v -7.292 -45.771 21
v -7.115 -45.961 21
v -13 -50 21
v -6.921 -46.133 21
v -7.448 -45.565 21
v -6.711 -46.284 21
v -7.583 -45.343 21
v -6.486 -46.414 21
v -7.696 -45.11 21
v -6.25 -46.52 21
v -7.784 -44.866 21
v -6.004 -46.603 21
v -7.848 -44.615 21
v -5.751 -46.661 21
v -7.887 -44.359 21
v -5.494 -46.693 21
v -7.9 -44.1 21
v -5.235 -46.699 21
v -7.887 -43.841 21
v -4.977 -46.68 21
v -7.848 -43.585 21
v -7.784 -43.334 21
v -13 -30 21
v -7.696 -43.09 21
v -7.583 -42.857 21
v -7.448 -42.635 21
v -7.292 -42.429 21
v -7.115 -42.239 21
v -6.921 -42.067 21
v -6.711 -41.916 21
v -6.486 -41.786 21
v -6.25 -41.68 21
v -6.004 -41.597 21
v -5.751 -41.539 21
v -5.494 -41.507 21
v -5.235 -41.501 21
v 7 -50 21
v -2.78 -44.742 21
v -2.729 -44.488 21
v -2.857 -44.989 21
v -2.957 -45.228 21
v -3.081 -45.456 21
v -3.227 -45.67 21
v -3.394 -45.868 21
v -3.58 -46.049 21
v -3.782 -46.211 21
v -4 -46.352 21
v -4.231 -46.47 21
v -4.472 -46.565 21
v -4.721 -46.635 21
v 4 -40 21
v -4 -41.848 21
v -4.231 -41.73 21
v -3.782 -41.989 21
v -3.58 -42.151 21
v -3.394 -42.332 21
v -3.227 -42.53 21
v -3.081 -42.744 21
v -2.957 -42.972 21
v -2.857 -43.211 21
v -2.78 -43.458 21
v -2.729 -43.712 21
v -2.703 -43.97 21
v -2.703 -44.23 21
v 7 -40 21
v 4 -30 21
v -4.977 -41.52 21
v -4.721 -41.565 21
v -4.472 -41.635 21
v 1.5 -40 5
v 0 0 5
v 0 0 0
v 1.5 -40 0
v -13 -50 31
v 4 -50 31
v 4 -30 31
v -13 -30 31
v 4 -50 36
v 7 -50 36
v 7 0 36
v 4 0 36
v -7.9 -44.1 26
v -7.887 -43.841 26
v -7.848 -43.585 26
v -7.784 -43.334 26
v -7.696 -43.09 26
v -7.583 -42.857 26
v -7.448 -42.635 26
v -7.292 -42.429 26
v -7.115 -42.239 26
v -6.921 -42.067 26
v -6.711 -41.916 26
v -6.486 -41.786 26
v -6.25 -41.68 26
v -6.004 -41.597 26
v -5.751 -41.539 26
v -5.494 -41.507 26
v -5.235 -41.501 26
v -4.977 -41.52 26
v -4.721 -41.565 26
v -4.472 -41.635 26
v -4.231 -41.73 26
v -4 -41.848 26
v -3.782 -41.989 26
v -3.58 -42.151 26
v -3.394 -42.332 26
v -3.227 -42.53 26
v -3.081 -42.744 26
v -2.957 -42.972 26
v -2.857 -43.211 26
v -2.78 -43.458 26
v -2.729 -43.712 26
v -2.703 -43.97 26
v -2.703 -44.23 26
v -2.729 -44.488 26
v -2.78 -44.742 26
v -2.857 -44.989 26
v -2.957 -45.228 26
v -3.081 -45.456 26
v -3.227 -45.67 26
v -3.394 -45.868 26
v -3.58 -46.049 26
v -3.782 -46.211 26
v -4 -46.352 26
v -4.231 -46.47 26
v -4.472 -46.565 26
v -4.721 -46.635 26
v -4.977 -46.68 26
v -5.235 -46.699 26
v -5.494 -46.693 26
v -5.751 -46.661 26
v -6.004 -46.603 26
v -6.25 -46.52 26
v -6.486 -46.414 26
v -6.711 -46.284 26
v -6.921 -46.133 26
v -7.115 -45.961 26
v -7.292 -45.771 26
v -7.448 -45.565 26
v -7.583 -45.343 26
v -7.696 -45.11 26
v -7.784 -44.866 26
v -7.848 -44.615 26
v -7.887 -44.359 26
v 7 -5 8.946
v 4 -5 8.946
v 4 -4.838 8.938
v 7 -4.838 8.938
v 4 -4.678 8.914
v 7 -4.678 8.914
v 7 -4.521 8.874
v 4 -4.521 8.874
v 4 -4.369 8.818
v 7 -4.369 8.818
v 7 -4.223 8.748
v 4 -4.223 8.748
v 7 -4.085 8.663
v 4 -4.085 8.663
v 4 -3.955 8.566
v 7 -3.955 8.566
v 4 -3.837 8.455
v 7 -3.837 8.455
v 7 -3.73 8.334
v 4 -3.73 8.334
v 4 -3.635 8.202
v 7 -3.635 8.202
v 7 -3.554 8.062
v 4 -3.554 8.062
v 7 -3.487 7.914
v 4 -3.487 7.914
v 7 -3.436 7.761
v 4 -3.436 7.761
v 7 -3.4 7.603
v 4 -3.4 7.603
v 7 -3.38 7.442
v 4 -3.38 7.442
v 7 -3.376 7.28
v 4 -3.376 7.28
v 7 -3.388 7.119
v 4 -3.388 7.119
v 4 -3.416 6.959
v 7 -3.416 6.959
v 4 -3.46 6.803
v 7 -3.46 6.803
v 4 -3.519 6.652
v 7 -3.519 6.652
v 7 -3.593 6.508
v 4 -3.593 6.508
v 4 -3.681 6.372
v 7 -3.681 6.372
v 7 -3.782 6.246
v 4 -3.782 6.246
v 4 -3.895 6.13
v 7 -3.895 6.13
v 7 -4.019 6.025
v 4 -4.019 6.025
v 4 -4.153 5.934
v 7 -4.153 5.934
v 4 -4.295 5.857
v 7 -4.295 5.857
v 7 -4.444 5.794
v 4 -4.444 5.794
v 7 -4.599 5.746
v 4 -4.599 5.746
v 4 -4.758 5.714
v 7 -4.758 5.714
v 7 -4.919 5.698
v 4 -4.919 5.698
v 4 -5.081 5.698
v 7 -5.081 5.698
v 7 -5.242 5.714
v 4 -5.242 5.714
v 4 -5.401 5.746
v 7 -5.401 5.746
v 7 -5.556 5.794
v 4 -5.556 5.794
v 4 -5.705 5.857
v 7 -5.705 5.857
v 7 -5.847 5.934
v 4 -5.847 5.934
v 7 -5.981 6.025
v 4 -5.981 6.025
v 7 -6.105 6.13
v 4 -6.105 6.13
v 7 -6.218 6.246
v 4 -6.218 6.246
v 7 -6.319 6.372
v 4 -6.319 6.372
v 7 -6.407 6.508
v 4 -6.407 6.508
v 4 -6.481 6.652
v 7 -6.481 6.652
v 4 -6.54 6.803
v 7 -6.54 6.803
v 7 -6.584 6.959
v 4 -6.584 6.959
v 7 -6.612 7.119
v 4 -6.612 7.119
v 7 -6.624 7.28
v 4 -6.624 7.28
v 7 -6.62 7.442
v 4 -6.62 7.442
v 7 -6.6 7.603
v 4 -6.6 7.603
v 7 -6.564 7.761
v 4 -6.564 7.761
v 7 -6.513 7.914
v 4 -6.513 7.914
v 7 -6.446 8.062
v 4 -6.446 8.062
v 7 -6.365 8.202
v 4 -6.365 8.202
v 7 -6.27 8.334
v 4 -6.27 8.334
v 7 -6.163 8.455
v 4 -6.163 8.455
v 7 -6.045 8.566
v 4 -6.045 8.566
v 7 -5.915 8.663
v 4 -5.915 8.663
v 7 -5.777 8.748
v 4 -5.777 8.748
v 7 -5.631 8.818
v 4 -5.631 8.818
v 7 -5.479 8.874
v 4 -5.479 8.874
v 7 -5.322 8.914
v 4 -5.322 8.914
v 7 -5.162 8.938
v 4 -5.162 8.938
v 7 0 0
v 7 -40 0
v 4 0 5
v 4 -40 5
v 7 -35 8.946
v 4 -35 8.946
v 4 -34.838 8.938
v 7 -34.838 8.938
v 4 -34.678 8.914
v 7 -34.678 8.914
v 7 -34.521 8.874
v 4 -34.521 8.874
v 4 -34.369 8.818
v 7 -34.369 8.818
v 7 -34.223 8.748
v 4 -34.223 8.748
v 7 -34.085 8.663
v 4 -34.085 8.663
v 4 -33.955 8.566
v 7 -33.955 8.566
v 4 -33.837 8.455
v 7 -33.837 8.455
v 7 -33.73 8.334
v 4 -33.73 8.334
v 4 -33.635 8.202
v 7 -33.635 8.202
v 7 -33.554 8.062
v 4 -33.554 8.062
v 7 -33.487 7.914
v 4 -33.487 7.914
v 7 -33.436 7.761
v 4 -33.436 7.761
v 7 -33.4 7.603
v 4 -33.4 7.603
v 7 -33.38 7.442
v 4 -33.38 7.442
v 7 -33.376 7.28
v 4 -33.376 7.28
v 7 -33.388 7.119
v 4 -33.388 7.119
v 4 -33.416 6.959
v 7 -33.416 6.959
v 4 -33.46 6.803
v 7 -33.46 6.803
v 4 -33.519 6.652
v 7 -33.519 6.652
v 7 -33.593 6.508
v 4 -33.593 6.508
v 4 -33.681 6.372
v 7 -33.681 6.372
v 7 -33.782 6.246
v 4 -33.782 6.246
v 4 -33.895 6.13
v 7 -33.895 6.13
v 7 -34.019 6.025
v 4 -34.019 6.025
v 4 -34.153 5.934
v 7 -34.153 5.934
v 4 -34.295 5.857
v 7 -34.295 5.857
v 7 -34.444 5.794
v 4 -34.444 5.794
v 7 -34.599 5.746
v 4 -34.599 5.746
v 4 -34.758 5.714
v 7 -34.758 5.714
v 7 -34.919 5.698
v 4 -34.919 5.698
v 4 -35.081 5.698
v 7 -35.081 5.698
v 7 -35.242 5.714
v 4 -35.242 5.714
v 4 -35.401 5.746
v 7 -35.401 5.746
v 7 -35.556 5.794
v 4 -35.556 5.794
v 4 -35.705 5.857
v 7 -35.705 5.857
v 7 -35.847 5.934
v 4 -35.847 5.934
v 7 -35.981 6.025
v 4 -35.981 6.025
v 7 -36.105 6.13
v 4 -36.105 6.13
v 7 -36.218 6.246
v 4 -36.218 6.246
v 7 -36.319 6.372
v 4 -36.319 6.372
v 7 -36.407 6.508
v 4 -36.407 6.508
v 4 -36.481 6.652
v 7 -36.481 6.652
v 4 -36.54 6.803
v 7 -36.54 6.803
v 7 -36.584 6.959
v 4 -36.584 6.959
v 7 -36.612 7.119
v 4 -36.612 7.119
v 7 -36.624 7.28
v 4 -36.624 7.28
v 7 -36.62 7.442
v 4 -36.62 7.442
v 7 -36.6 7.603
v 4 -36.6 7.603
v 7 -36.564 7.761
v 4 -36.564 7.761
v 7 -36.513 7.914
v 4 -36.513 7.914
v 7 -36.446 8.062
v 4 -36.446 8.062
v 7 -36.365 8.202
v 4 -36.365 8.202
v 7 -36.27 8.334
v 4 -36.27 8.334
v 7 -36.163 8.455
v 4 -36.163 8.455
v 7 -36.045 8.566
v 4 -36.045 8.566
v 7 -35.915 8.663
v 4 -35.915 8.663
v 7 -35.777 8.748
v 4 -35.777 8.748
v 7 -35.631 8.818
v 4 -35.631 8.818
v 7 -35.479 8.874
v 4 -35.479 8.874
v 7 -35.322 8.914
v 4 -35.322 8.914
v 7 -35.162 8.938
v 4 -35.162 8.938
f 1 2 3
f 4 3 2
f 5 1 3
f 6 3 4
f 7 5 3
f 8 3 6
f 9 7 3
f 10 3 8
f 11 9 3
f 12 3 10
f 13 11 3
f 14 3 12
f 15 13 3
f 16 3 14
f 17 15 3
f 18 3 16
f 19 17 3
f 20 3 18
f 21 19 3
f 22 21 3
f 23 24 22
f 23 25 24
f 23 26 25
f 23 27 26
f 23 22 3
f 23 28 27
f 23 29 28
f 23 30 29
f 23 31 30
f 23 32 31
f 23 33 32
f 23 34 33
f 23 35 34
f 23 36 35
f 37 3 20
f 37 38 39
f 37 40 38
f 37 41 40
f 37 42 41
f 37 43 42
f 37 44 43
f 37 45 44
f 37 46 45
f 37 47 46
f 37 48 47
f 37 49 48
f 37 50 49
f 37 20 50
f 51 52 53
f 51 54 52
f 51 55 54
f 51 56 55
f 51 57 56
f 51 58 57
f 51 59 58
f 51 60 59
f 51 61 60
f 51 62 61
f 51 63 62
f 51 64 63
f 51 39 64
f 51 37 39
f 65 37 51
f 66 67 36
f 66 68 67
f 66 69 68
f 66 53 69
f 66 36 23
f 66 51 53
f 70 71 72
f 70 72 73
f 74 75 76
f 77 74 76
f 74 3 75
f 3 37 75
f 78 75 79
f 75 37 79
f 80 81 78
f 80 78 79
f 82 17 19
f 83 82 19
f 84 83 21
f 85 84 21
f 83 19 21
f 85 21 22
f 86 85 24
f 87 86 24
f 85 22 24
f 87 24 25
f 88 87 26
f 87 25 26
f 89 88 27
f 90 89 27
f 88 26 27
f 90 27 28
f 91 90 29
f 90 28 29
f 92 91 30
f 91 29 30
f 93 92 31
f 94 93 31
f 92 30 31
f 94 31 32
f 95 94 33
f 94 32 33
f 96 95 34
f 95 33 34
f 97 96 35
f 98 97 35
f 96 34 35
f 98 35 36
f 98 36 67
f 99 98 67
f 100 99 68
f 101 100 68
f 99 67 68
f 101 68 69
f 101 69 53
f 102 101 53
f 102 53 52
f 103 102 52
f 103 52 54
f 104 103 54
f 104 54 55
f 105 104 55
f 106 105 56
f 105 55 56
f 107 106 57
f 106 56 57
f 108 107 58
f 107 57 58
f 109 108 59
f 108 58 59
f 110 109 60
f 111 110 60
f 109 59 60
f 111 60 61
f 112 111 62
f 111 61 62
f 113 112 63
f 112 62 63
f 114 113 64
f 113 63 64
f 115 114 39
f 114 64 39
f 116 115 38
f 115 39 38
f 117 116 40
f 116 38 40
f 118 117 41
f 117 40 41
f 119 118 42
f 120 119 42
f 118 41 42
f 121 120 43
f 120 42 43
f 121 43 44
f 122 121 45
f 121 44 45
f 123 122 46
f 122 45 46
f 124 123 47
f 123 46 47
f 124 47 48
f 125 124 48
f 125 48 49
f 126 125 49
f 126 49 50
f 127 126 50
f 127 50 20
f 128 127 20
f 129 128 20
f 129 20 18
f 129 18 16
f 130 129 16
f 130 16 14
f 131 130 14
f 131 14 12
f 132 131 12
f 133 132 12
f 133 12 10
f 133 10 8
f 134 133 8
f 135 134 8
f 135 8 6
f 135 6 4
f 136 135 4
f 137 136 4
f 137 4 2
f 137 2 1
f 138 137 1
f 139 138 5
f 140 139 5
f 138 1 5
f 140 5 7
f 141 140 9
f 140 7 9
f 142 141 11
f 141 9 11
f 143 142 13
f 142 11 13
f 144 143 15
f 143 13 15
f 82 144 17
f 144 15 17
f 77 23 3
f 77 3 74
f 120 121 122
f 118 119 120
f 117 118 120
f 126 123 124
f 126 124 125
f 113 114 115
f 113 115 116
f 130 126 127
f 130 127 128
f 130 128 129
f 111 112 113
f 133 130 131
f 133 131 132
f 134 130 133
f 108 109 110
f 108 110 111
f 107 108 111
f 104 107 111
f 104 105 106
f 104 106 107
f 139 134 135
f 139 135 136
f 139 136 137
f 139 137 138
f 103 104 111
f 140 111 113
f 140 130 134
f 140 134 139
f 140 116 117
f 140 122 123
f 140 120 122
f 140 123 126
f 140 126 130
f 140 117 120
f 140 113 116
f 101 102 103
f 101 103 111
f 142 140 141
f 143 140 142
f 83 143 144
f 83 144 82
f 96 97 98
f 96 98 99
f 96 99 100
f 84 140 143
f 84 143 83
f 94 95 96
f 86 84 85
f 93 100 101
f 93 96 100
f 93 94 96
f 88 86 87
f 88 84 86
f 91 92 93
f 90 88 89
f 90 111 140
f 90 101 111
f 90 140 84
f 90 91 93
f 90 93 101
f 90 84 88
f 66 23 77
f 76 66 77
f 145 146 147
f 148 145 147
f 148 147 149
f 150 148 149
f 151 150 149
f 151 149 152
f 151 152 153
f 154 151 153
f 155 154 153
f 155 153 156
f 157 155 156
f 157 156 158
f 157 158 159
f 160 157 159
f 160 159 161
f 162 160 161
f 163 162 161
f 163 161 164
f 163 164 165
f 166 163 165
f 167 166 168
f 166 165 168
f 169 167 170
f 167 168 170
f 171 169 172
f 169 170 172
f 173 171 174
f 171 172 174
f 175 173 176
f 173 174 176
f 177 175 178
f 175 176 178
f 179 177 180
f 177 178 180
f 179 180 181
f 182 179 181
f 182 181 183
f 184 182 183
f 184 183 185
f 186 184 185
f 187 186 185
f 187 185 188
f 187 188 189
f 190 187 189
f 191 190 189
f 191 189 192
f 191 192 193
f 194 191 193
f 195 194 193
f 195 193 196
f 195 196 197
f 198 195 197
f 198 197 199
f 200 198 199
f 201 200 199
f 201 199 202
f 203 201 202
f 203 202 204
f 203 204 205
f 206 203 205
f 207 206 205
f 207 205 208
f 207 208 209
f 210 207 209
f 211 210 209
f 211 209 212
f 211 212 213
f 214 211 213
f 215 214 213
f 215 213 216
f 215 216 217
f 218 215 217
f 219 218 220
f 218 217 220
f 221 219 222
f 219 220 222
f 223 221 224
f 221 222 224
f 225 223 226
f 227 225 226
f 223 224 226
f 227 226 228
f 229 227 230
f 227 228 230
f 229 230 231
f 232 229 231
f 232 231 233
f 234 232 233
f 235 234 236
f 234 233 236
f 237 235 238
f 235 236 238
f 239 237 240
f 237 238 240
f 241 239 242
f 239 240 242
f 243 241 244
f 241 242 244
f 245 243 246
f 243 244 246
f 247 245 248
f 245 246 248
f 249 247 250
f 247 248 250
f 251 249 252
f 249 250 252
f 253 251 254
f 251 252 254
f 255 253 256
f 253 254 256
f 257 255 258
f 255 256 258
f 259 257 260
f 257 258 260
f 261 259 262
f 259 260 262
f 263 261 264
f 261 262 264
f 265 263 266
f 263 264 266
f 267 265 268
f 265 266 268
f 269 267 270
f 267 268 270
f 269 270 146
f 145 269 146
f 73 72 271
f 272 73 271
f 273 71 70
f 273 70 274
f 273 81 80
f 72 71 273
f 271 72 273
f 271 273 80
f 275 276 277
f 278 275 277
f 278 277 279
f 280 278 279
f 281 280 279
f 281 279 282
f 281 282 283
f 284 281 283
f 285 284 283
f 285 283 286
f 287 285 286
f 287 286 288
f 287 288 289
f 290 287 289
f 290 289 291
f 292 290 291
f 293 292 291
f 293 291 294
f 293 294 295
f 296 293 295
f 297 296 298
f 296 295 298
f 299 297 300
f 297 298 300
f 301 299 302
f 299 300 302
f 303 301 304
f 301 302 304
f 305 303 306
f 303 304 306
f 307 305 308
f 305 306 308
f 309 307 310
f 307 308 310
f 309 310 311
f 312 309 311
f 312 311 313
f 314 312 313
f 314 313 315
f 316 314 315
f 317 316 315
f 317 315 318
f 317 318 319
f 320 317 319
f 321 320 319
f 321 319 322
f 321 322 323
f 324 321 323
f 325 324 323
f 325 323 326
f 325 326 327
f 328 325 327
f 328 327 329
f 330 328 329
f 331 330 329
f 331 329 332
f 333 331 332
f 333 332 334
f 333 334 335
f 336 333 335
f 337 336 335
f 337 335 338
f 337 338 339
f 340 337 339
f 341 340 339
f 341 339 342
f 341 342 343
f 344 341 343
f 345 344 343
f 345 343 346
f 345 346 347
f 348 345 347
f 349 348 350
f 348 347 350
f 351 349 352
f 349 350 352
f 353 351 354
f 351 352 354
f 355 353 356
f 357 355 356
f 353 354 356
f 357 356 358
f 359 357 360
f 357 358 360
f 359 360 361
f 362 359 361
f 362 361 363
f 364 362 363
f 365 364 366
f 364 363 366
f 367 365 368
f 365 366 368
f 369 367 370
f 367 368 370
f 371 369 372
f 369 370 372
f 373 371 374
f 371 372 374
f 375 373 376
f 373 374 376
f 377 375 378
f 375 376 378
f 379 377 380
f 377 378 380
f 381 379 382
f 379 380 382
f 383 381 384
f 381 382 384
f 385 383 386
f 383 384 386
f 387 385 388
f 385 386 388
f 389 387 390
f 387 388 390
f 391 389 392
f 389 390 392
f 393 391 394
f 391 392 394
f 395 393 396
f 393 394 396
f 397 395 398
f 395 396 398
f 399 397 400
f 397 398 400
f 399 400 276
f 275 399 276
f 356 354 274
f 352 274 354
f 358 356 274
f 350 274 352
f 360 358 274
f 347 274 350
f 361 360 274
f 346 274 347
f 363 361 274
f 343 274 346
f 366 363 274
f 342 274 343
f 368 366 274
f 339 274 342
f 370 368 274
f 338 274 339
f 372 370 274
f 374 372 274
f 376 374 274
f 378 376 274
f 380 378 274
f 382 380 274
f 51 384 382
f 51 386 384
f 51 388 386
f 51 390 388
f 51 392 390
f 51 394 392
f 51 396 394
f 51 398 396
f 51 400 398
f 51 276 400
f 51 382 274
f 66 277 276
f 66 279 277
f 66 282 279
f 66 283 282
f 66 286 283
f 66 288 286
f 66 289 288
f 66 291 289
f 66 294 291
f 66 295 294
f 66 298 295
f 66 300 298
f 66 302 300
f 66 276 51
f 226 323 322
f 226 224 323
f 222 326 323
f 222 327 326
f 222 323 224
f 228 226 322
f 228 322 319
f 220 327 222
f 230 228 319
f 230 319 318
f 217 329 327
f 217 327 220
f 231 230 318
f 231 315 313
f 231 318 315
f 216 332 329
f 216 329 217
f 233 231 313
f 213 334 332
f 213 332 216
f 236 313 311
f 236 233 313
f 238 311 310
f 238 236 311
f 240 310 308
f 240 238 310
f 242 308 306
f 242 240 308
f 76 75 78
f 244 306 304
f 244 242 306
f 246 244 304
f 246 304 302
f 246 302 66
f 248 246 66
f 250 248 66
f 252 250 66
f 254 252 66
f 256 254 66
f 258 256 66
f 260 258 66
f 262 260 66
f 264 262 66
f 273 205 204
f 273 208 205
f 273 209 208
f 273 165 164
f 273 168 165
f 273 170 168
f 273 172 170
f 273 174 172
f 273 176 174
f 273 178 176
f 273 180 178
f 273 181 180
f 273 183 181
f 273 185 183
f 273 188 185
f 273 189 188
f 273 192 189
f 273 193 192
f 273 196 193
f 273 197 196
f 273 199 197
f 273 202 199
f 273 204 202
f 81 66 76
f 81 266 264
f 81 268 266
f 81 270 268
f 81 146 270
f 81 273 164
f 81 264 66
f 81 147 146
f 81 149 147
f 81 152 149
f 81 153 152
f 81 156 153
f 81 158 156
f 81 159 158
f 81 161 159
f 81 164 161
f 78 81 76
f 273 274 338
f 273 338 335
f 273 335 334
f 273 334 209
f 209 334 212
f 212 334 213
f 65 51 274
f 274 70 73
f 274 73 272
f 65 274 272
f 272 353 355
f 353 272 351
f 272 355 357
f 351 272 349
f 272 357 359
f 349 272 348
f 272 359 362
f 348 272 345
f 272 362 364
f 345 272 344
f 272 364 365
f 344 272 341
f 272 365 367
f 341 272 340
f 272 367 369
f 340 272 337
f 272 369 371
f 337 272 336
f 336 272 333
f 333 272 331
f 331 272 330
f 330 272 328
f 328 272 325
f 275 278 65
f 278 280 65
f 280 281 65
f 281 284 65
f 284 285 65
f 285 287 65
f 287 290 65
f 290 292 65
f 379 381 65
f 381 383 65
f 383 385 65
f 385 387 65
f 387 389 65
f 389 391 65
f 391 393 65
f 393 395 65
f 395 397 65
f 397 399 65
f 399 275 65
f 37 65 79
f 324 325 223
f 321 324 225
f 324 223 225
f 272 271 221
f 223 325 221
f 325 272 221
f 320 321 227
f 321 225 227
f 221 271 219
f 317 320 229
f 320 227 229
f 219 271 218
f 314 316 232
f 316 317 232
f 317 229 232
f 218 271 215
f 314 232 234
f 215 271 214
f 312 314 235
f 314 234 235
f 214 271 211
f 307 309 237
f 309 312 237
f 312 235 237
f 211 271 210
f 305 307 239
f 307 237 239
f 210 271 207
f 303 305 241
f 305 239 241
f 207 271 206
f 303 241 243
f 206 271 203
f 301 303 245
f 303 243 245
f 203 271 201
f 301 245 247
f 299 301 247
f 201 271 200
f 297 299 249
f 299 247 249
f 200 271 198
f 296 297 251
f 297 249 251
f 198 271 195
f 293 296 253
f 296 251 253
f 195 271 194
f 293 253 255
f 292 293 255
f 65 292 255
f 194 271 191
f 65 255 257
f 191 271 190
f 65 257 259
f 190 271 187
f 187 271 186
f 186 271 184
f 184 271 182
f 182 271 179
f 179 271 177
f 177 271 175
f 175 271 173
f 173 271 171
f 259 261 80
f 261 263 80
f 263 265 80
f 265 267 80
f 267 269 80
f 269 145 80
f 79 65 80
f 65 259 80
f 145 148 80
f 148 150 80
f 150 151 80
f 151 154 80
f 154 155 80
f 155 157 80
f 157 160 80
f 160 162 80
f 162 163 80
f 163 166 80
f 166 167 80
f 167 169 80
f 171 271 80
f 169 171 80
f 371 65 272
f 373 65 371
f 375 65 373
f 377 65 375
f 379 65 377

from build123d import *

# Parameters (mm, degrees)
ESQUISSE1_W             = 7
ESQUISSE1_H             = 40
BOSS_EXTRU_1_DEPTH      = 5
ENL_V_MAT_EXTRU_1_DEPTH = 5
ESQUISSE3_W             = 3
ESQUISSE3_H             = 40
BOSS_EXTRU_2_DEPTH      = 6
ESQUISSE5_W             = 3
ESQUISSE5_H             = 10
BOSS_EXTRU_3_DEPTH      = 25
ESQUISSE4_R             = 1.625
ENL_V_MAT_EXTRU_2_DEPTH = 4
ESQUISSE9_W             = 3
ESQUISSE9_H             = 30
BOSS_EXTRU_5_DEPTH      = 25
ESQUISSE10_W            = 3
ESQUISSE10_H            = 15
BOSS_EXTRU_6_DEPTH      = 10
ESQUISSE11_W            = 10
ESQUISSE11_H            = 20
BOSS_EXTRU_7_DEPTH      = 17
ESQUISSE12_R            = 2.6
ENL_V_MAT_EXTRU_3_DEPTH = 5


with BuildPart() as part:
    # Esquisse1 → Boss.-Extru.1 (new body)
    with BuildSketch(Plane.XY):
        with Locations((3.5, -20)):
            Rectangle(ESQUISSE1_W, ESQUISSE1_H)
    extrude(amount=BOSS_EXTRU_1_DEPTH)

    # Esquisse2 → Enlèv. mat.-Extru.1 (cut)
    with BuildSketch(Plane.XY.offset(5)):
        Polygon((0, -40), (0, 0), (1.5, -40), align=None)
    extrude(amount=-ENL_V_MAT_EXTRU_1_DEPTH, mode=Mode.SUBTRACT)

    # Esquisse3 → Boss.-Extru.2 (add)
    with BuildSketch(Plane.XY.offset(5)):
        with Locations((5.5, -20)):
            Rectangle(ESQUISSE3_W, ESQUISSE3_H)
    extrude(amount=BOSS_EXTRU_2_DEPTH)

    # Esquisse5 → Boss.-Extru.3 (add)
    with BuildSketch(Plane.XY.offset(11)):
        with Locations((5.5, -5)):
            Rectangle(ESQUISSE5_W, ESQUISSE5_H)
    extrude(amount=BOSS_EXTRU_3_DEPTH)

    # Esquisse4 → Enlèv. mat.-Extru.2 (cut, through all)
    with BuildSketch(Plane.ZY.offset(-4)):
        with Locations((7.320815767, -35)):
            Circle(ESQUISSE4_R)
        with Locations((7.320815767, -5)):
            Circle(ESQUISSE4_R)
    extrude(amount=-ENL_V_MAT_EXTRU_2_DEPTH, mode=Mode.SUBTRACT)

    # Esquisse9 → Boss.-Extru.5 (add)
    with BuildSketch(Plane.XY.offset(11)):
        with Locations((5.5, -25)):
            Rectangle(ESQUISSE9_W, ESQUISSE9_H)
    extrude(amount=BOSS_EXTRU_5_DEPTH)

    # Esquisse10 → Boss.-Extru.6 (add)
    with BuildSketch(Plane.XZ.offset(40)):
        with Locations((5.5, 28.5)):
            Rectangle(ESQUISSE10_W, ESQUISSE10_H)
    extrude(amount=BOSS_EXTRU_6_DEPTH)

    # Esquisse11 → Boss.-Extru.7 (add)
    with BuildSketch(Plane.ZY.offset(-4)):
        with Locations((26, -40)):
            Rectangle(ESQUISSE11_W, ESQUISSE11_H)
    extrude(amount=BOSS_EXTRU_7_DEPTH)

    # Esquisse12 → Enlèv. mat.-Extru.3 (cut)
    with BuildSketch(Plane(origin=(0, 0, 21), x_dir=(-1, 0, 0), z_dir=(0, 0, -1))):
        with Locations((5.3, -44.1)):
            Circle(ESQUISSE12_R)
    extrude(amount=-ENL_V_MAT_EXTRU_3_DEPTH, mode=Mode.SUBTRACT)


solid = part.part
